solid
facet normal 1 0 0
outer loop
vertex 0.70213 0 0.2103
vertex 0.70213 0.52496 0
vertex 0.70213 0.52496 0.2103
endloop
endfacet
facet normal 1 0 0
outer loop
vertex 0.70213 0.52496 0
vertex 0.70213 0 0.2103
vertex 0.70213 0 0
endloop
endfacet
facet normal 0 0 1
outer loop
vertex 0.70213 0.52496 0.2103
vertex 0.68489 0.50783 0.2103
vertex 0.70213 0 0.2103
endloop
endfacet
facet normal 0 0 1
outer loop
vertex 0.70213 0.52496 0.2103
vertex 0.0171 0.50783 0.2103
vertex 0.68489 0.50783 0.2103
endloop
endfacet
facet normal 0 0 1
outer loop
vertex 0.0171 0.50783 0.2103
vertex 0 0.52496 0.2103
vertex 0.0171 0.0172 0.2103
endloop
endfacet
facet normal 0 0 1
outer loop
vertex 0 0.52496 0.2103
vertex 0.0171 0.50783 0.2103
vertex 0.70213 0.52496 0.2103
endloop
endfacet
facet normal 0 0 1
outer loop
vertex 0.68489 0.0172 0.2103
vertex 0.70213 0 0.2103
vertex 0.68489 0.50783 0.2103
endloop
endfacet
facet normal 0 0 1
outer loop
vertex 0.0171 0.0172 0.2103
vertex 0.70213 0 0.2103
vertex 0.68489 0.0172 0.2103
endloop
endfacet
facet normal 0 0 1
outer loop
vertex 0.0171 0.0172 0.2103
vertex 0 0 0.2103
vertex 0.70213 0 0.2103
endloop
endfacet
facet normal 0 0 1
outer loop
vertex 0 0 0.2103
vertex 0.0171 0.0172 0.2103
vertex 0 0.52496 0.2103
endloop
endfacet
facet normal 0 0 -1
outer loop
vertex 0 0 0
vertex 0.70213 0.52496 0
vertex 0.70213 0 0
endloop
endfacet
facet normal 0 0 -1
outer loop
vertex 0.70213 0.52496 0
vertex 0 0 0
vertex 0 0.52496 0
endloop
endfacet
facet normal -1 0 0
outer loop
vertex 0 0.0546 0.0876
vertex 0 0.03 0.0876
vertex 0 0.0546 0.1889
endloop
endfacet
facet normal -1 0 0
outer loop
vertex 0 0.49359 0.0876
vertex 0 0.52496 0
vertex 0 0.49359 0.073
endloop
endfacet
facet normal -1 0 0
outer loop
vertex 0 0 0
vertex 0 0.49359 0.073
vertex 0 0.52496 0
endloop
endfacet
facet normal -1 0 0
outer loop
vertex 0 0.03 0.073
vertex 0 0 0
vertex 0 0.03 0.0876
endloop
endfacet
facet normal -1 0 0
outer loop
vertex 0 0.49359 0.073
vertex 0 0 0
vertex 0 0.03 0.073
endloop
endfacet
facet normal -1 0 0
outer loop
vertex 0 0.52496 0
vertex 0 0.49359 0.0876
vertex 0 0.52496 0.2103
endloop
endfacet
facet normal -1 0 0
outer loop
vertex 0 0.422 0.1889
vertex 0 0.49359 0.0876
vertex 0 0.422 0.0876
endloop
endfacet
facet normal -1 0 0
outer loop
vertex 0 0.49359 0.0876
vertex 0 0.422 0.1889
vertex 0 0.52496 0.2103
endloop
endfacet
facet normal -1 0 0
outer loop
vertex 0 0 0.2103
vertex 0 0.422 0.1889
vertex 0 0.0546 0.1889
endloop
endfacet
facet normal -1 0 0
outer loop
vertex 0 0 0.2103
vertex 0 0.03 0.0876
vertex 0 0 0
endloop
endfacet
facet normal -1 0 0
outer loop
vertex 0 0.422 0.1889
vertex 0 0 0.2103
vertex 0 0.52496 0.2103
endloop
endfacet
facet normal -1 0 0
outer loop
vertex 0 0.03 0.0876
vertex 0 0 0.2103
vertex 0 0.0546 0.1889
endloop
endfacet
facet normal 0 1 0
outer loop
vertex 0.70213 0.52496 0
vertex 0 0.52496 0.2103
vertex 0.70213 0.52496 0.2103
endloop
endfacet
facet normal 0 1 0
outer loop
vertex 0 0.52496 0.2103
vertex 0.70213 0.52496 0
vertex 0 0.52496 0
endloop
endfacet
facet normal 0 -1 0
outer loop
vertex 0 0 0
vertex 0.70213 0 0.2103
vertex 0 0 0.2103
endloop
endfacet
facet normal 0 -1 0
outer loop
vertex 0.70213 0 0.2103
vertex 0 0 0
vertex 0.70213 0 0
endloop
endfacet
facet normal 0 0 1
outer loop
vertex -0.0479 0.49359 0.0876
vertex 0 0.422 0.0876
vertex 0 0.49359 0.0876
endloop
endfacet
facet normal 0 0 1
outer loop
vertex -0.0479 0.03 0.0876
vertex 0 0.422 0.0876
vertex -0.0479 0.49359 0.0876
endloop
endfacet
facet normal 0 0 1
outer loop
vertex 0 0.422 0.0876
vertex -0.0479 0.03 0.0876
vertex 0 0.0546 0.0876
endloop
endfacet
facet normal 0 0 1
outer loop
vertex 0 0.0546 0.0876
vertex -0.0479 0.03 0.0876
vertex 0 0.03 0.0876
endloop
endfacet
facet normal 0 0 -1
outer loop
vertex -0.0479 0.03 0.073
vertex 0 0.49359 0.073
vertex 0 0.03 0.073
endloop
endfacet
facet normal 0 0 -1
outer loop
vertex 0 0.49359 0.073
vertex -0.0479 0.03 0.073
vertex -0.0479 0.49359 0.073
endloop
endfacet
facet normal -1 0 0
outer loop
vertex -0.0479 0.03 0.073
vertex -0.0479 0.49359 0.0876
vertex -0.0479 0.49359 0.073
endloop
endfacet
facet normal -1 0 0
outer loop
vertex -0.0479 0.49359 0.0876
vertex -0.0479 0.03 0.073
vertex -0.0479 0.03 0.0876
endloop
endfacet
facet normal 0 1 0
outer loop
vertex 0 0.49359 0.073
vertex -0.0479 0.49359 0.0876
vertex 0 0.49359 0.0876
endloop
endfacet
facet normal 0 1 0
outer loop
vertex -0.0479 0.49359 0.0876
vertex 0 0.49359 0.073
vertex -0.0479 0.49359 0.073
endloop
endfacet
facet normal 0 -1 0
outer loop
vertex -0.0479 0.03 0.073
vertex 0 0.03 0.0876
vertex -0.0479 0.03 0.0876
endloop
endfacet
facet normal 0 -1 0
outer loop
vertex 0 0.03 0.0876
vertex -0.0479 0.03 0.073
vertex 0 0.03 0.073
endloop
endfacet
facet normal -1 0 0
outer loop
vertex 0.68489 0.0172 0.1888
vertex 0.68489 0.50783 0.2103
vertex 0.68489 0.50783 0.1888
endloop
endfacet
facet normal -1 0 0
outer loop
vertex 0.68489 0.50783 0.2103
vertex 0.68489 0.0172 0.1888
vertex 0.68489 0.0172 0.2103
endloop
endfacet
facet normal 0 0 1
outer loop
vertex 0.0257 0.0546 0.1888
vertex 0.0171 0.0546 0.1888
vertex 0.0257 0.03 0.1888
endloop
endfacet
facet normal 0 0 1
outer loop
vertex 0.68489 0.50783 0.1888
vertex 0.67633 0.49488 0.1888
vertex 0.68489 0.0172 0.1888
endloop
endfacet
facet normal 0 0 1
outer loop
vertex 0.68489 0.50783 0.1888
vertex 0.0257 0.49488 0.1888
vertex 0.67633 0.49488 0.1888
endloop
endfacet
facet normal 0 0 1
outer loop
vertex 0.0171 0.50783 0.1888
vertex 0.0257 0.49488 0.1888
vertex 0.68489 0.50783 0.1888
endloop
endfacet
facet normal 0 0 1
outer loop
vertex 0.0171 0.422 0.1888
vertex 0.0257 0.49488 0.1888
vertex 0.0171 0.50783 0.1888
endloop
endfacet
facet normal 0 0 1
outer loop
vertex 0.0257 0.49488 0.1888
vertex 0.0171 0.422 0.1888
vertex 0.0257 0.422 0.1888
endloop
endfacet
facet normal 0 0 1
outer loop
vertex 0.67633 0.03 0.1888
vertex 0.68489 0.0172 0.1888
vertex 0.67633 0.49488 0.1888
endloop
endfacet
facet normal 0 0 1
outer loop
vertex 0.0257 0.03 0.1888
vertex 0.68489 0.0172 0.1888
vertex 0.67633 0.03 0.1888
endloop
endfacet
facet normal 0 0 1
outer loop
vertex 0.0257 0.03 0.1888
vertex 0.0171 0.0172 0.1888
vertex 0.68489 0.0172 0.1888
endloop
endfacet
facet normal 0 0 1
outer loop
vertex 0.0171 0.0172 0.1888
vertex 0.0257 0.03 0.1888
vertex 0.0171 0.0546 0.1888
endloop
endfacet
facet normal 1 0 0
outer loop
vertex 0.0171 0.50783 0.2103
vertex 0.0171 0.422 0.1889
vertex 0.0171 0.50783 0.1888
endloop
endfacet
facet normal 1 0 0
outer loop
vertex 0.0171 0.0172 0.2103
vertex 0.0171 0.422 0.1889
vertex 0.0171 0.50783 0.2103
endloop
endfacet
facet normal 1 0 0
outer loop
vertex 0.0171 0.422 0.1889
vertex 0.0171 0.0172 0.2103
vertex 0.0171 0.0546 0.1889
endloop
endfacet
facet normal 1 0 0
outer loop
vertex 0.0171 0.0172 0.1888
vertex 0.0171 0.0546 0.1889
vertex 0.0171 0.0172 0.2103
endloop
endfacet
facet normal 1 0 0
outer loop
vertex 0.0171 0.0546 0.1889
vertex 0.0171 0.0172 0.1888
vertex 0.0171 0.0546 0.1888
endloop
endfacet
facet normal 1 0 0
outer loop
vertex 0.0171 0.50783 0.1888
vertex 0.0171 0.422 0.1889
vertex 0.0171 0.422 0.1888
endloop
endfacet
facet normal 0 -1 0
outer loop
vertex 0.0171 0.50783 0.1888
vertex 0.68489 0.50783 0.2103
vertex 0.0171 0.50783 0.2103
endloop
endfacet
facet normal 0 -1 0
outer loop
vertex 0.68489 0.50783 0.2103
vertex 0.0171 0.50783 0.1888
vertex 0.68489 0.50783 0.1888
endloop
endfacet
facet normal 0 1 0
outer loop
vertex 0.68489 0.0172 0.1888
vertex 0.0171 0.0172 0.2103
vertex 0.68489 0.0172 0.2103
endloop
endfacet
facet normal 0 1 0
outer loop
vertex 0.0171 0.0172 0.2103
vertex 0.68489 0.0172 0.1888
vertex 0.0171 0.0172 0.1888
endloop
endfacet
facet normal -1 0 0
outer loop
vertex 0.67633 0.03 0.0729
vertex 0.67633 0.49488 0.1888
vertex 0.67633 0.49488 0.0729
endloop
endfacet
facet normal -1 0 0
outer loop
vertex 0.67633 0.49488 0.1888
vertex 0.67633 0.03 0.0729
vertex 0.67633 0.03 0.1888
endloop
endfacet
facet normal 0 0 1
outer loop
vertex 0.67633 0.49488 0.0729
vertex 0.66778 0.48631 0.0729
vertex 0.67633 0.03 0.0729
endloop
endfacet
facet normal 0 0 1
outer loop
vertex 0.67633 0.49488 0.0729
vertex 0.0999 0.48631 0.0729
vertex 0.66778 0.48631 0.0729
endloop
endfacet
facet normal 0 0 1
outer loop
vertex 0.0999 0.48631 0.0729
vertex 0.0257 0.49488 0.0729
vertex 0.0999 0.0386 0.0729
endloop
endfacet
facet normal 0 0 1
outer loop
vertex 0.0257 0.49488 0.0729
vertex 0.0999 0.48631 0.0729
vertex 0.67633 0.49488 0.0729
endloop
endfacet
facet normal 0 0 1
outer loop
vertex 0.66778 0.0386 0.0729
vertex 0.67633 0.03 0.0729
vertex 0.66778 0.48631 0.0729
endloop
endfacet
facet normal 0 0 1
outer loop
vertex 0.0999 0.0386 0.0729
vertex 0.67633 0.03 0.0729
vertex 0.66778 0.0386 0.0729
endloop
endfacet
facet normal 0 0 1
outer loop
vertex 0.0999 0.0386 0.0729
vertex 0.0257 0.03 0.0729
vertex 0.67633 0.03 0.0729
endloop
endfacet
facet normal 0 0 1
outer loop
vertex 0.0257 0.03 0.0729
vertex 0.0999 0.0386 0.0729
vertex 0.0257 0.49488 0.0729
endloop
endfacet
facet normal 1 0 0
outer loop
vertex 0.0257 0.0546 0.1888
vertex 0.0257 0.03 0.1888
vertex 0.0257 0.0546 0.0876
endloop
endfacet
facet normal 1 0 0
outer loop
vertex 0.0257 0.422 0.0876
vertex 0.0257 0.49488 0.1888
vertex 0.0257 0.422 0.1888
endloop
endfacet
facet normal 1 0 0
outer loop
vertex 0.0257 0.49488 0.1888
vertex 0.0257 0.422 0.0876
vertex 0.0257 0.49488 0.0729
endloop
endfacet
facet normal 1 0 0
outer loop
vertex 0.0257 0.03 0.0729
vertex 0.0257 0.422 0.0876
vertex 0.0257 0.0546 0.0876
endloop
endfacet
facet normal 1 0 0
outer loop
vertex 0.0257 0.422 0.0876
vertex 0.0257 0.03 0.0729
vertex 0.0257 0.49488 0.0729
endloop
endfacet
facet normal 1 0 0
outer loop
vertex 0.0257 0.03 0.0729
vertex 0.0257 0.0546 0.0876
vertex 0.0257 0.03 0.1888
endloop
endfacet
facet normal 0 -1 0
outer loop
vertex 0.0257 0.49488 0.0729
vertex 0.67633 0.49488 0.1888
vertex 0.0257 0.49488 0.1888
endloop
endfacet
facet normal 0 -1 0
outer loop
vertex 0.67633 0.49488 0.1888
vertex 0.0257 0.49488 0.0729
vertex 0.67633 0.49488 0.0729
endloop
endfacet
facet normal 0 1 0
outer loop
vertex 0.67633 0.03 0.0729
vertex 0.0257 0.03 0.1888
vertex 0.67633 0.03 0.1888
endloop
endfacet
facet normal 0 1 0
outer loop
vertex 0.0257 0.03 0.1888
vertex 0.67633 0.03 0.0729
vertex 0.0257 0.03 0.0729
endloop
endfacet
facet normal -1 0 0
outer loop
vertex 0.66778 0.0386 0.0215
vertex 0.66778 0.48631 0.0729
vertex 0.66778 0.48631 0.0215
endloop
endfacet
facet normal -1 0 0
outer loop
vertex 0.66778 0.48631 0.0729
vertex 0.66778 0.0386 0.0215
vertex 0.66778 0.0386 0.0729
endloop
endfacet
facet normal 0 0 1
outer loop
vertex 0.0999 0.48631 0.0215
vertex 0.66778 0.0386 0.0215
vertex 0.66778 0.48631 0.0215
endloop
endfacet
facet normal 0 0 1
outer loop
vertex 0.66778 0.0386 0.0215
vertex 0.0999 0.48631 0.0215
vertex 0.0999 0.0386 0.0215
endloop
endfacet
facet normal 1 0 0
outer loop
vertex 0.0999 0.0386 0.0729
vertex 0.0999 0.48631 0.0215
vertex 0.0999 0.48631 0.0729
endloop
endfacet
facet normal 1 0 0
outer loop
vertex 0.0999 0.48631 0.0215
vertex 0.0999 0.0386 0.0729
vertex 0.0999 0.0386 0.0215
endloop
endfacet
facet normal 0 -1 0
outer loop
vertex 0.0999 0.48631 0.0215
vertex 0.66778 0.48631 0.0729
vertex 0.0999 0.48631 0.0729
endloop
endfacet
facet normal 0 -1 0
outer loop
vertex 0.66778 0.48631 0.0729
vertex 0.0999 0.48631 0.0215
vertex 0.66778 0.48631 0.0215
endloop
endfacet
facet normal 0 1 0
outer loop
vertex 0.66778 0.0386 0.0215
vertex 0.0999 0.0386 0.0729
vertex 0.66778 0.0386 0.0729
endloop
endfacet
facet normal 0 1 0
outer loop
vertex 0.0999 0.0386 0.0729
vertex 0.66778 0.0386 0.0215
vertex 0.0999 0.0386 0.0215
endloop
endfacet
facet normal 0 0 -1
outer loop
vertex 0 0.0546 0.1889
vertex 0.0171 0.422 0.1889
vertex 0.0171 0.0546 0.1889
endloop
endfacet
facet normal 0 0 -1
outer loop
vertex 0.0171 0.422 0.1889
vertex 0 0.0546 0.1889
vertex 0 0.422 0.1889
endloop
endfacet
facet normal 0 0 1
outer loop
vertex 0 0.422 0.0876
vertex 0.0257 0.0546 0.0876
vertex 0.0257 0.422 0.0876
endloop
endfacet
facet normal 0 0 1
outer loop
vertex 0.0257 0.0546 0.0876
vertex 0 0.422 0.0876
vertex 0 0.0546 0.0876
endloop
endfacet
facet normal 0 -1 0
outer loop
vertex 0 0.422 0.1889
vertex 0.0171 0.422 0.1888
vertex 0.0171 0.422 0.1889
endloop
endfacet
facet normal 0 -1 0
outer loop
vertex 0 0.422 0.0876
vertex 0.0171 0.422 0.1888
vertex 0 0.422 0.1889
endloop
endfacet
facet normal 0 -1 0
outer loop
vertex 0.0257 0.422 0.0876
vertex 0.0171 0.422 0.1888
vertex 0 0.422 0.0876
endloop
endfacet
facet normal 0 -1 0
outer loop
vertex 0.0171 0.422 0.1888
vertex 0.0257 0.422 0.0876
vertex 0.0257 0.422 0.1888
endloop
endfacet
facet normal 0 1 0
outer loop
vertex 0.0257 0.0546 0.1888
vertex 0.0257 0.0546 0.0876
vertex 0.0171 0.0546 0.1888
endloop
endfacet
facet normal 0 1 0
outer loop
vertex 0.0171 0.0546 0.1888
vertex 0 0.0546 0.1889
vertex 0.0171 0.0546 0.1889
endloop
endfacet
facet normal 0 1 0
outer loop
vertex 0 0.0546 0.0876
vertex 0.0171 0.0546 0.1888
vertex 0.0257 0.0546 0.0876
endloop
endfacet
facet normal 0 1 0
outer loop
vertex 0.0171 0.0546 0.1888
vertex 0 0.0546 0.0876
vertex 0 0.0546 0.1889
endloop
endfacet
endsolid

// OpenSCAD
// Main body dimensions
body_length = 0.702127;
body_width = 0.524964;
body_height = 0.2103;

// Shallow top recess
recess1_length = 0.667793;
recess1_width = 0.490631;
recess1_x = 0.0171;       // inset from left edge
recess1_y = 0.0172;        // inset from front edge
recess1_z_bot = 0.1888;    // bottom of recess above underside
recess1_z_top = 0.2103;    // top of recess (body top)

// Deeper contained rectangular cut
recess2_length = 0.650626;
recess2_width = 0.46488;
recess2_x = 0.0257;        // inset from left edge
recess2_y = 0.03;           // inset from front edge
recess2_z_bot = 0.0729;    // bottom of cut above underside
recess2_z_top = 0.1888;    // top of cut

// Lower pocket
recess3_length = 0.567882;
recess3_width = 0.447713;
recess3_x = 0.0999;        // inset from left edge
recess3_y = 0.0386;         // inset from front edge
recess3_z_bot = 0.0215;    // bottom of pocket above underside
recess3_z_top = 0.073;     // top of pocket

// Side projection (added solid)
proj_length = 0.130618;
proj_width = 0.463588;
proj_x = -0.0479;          // overhangs left edge
proj_y = 0.03;              // inset from front edge
proj_z_bot = 0.073;         // bottom of projection above underside
proj_z_top = 0.0876;        // top of projection

// Side recess (rectangular cut at left edge)
side_recess_depth = 0.0343; // depth into body from left (X)
side_recess_length = 0.3674; // extent along Y
side_recess_x = 0;           // starts at left edge
side_recess_y = 0.0546;      // inset from front edge
side_recess_z_bot = 0.0876;  // bottom of recess above underside
side_recess_z_top = 0.1889;  // top of recess

$fn = 32;

difference() {
    // Solid body union
    union() {
        // Main rectangular body
        cube([body_length, body_width, body_height]);

        // Side projection on left edge
        translate([proj_x, proj_y, proj_z_bot])
            cube([proj_length, proj_width, proj_z_top - proj_z_bot]);
    }

    // Shallow top recess
    translate([recess1_x, recess1_y, recess1_z_bot])
        cube([recess1_length, recess1_width, recess1_z_top - recess1_z_bot]);

    // Deeper contained rectangular cut
    translate([recess2_x, recess2_y, recess2_z_bot])
        cube([recess2_length, recess2_width, recess2_z_top - recess2_z_bot]);

    // Lower pocket
    translate([recess3_x, recess3_y, recess3_z_bot])
        cube([recess3_length, recess3_width, recess3_z_top - recess3_z_bot]);

    // Side recess at left edge
    translate([side_recess_x, side_recess_y, side_recess_z_bot])
        cube([side_recess_depth, side_recess_length, side_recess_z_top - side_recess_z_bot]);
}
